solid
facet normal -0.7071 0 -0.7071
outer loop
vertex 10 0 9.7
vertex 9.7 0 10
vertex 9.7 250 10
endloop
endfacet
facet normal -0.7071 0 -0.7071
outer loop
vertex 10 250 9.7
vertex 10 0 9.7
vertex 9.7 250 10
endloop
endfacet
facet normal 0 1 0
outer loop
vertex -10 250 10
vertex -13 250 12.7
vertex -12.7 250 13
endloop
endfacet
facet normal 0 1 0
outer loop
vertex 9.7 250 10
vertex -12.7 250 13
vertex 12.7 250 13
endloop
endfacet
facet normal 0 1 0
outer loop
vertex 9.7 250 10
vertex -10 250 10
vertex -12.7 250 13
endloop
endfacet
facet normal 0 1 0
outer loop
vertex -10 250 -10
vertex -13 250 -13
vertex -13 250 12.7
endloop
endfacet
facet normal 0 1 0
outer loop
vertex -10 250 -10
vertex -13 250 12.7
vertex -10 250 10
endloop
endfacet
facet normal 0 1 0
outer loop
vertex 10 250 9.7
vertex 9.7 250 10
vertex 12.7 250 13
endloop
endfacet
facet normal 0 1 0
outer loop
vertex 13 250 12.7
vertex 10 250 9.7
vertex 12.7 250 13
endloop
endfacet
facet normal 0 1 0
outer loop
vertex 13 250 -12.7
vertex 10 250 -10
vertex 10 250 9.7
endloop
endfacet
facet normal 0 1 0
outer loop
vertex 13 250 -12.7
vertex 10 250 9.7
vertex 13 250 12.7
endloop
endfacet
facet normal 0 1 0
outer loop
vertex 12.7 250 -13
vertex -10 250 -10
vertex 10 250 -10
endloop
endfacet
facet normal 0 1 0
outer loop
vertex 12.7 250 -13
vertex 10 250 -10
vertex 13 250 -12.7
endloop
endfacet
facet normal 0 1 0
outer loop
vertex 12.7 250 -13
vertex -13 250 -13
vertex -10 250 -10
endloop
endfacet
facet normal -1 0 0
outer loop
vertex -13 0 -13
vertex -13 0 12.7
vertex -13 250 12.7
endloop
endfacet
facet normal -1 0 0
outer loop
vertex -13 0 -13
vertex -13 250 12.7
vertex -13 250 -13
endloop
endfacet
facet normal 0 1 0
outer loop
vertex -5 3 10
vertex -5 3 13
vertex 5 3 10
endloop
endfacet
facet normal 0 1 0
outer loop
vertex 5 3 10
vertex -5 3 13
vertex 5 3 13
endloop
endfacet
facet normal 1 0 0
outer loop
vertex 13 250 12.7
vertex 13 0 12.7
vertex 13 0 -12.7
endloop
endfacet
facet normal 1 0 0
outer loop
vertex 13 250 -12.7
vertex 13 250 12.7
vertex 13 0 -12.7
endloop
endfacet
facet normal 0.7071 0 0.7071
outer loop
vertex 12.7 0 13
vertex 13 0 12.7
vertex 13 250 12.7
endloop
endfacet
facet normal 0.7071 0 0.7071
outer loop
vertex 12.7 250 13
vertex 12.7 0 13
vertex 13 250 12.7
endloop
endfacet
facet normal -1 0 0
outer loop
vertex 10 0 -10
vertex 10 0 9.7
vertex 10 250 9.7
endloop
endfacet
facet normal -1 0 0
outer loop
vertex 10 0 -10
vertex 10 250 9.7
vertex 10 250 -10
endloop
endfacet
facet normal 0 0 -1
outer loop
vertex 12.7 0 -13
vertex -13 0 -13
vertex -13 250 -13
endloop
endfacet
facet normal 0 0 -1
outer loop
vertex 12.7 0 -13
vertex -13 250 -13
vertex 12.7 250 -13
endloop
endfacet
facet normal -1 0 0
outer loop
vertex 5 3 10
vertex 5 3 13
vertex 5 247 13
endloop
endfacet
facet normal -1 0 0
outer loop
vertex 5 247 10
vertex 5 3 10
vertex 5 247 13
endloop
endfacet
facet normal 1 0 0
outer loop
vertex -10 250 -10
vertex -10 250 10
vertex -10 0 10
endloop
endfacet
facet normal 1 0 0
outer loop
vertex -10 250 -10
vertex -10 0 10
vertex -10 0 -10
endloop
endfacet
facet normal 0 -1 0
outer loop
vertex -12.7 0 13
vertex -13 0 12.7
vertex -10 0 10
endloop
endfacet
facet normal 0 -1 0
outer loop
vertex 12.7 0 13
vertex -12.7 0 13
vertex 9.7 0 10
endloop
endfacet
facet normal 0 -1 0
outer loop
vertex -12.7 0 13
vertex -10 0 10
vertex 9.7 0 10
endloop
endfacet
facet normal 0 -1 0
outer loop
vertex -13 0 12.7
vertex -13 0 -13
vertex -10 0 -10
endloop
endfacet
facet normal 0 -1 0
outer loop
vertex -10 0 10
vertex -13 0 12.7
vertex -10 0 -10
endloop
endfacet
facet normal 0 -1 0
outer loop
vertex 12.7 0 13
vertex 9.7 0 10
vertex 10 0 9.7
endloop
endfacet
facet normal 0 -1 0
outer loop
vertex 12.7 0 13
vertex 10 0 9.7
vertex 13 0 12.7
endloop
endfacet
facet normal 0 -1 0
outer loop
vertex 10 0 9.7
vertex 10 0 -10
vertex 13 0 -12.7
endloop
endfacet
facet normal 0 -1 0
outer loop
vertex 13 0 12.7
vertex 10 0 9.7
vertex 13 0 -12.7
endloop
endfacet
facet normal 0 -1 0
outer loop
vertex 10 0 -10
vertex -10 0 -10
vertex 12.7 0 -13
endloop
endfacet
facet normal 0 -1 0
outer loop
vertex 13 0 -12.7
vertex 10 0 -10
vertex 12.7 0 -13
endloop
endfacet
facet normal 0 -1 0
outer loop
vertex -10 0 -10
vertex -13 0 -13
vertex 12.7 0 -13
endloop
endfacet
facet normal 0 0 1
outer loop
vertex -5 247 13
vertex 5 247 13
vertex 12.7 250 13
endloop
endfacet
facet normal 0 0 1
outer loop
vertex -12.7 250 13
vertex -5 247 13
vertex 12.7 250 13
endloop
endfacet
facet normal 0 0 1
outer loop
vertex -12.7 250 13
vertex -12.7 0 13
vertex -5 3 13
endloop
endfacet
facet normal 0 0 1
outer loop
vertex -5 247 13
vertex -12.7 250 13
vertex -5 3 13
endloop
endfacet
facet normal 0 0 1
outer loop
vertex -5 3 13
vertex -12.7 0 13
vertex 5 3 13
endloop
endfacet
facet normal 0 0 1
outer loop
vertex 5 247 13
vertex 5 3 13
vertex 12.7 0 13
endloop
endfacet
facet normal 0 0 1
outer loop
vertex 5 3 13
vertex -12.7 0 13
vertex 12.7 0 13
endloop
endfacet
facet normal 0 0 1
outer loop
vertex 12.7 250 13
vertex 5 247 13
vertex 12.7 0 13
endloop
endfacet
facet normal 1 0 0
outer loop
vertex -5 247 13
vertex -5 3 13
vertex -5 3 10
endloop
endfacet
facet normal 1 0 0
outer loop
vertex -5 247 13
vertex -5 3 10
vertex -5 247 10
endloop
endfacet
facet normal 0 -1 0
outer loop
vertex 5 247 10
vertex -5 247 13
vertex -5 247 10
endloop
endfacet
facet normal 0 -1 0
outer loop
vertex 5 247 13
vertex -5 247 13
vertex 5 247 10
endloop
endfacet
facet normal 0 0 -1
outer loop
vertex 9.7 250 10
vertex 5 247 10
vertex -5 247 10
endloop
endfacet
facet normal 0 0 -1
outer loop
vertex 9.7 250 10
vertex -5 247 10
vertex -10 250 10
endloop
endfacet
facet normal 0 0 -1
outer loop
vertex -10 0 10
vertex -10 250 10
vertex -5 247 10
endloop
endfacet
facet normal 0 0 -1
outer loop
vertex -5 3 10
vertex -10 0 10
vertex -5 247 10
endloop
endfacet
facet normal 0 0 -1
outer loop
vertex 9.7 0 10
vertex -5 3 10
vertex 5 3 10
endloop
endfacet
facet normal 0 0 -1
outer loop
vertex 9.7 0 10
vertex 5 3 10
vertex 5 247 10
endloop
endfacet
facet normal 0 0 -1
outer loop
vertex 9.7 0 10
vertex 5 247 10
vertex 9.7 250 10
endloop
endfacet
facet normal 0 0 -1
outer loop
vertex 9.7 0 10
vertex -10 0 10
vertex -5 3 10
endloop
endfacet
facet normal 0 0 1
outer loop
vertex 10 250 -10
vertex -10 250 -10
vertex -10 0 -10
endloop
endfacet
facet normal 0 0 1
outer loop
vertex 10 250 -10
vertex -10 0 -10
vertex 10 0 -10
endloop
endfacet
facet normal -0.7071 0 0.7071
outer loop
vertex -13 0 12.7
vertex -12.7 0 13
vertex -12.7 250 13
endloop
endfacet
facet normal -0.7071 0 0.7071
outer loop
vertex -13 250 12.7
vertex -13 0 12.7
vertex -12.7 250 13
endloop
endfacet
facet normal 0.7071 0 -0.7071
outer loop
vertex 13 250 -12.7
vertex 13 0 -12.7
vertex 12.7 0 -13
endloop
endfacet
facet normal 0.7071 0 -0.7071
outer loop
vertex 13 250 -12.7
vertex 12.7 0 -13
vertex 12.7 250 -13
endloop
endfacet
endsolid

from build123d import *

# Parameters (mm, degrees)
SKETCH1_W           = 26
SKETCH1_H           = 26
BOSS_EXTRUDE1_DEPTH = 250
SHELL1_T            = -3
SKETCH2_W           = 10
SKETCH2_H           = 244
CUT_EXTRUDE1_DEPTH  = 3
CHAMFER1_SIZE       = 0.3


with BuildPart() as part:
    # Sketch1 → Boss-Extrude1 (new body)
    with BuildSketch(Plane(origin=(0, 0, 0), x_dir=(1, 0, 0), z_dir=(0, 1, 0))):
        Rectangle(SKETCH1_W, SKETCH1_H)
    extrude(amount=BOSS_EXTRUDE1_DEPTH)

    # Shell1
    shell1_openings = [part.faces().sort_by_distance(p)[0] for p in [
        (0, 250, 0),
        (0, 0, 0),
    ]]
    offset(amount=SHELL1_T, openings=shell1_openings, kind=Kind.INTERSECTION)

    # Sketch2 → Cut-Extrude1 (cut)
    with BuildSketch(Plane.XY.offset(13)):
        with Locations((0, 125)):
            Rectangle(SKETCH2_W, SKETCH2_H)
    extrude(amount=-CUT_EXTRUDE1_DEPTH, mode=Mode.SUBTRACT)

    # Chamfer1
    chamfer1_edges = [part.edges().sort_by_distance(p)[0] for p in [
        (10, 125, 10),
        (13, 125, 13),
        (-13, 125, 13),
        (13, 125, -13),
    ]]
    chamfer(chamfer1_edges, length=CHAMFER1_SIZE)


solid = part.part
